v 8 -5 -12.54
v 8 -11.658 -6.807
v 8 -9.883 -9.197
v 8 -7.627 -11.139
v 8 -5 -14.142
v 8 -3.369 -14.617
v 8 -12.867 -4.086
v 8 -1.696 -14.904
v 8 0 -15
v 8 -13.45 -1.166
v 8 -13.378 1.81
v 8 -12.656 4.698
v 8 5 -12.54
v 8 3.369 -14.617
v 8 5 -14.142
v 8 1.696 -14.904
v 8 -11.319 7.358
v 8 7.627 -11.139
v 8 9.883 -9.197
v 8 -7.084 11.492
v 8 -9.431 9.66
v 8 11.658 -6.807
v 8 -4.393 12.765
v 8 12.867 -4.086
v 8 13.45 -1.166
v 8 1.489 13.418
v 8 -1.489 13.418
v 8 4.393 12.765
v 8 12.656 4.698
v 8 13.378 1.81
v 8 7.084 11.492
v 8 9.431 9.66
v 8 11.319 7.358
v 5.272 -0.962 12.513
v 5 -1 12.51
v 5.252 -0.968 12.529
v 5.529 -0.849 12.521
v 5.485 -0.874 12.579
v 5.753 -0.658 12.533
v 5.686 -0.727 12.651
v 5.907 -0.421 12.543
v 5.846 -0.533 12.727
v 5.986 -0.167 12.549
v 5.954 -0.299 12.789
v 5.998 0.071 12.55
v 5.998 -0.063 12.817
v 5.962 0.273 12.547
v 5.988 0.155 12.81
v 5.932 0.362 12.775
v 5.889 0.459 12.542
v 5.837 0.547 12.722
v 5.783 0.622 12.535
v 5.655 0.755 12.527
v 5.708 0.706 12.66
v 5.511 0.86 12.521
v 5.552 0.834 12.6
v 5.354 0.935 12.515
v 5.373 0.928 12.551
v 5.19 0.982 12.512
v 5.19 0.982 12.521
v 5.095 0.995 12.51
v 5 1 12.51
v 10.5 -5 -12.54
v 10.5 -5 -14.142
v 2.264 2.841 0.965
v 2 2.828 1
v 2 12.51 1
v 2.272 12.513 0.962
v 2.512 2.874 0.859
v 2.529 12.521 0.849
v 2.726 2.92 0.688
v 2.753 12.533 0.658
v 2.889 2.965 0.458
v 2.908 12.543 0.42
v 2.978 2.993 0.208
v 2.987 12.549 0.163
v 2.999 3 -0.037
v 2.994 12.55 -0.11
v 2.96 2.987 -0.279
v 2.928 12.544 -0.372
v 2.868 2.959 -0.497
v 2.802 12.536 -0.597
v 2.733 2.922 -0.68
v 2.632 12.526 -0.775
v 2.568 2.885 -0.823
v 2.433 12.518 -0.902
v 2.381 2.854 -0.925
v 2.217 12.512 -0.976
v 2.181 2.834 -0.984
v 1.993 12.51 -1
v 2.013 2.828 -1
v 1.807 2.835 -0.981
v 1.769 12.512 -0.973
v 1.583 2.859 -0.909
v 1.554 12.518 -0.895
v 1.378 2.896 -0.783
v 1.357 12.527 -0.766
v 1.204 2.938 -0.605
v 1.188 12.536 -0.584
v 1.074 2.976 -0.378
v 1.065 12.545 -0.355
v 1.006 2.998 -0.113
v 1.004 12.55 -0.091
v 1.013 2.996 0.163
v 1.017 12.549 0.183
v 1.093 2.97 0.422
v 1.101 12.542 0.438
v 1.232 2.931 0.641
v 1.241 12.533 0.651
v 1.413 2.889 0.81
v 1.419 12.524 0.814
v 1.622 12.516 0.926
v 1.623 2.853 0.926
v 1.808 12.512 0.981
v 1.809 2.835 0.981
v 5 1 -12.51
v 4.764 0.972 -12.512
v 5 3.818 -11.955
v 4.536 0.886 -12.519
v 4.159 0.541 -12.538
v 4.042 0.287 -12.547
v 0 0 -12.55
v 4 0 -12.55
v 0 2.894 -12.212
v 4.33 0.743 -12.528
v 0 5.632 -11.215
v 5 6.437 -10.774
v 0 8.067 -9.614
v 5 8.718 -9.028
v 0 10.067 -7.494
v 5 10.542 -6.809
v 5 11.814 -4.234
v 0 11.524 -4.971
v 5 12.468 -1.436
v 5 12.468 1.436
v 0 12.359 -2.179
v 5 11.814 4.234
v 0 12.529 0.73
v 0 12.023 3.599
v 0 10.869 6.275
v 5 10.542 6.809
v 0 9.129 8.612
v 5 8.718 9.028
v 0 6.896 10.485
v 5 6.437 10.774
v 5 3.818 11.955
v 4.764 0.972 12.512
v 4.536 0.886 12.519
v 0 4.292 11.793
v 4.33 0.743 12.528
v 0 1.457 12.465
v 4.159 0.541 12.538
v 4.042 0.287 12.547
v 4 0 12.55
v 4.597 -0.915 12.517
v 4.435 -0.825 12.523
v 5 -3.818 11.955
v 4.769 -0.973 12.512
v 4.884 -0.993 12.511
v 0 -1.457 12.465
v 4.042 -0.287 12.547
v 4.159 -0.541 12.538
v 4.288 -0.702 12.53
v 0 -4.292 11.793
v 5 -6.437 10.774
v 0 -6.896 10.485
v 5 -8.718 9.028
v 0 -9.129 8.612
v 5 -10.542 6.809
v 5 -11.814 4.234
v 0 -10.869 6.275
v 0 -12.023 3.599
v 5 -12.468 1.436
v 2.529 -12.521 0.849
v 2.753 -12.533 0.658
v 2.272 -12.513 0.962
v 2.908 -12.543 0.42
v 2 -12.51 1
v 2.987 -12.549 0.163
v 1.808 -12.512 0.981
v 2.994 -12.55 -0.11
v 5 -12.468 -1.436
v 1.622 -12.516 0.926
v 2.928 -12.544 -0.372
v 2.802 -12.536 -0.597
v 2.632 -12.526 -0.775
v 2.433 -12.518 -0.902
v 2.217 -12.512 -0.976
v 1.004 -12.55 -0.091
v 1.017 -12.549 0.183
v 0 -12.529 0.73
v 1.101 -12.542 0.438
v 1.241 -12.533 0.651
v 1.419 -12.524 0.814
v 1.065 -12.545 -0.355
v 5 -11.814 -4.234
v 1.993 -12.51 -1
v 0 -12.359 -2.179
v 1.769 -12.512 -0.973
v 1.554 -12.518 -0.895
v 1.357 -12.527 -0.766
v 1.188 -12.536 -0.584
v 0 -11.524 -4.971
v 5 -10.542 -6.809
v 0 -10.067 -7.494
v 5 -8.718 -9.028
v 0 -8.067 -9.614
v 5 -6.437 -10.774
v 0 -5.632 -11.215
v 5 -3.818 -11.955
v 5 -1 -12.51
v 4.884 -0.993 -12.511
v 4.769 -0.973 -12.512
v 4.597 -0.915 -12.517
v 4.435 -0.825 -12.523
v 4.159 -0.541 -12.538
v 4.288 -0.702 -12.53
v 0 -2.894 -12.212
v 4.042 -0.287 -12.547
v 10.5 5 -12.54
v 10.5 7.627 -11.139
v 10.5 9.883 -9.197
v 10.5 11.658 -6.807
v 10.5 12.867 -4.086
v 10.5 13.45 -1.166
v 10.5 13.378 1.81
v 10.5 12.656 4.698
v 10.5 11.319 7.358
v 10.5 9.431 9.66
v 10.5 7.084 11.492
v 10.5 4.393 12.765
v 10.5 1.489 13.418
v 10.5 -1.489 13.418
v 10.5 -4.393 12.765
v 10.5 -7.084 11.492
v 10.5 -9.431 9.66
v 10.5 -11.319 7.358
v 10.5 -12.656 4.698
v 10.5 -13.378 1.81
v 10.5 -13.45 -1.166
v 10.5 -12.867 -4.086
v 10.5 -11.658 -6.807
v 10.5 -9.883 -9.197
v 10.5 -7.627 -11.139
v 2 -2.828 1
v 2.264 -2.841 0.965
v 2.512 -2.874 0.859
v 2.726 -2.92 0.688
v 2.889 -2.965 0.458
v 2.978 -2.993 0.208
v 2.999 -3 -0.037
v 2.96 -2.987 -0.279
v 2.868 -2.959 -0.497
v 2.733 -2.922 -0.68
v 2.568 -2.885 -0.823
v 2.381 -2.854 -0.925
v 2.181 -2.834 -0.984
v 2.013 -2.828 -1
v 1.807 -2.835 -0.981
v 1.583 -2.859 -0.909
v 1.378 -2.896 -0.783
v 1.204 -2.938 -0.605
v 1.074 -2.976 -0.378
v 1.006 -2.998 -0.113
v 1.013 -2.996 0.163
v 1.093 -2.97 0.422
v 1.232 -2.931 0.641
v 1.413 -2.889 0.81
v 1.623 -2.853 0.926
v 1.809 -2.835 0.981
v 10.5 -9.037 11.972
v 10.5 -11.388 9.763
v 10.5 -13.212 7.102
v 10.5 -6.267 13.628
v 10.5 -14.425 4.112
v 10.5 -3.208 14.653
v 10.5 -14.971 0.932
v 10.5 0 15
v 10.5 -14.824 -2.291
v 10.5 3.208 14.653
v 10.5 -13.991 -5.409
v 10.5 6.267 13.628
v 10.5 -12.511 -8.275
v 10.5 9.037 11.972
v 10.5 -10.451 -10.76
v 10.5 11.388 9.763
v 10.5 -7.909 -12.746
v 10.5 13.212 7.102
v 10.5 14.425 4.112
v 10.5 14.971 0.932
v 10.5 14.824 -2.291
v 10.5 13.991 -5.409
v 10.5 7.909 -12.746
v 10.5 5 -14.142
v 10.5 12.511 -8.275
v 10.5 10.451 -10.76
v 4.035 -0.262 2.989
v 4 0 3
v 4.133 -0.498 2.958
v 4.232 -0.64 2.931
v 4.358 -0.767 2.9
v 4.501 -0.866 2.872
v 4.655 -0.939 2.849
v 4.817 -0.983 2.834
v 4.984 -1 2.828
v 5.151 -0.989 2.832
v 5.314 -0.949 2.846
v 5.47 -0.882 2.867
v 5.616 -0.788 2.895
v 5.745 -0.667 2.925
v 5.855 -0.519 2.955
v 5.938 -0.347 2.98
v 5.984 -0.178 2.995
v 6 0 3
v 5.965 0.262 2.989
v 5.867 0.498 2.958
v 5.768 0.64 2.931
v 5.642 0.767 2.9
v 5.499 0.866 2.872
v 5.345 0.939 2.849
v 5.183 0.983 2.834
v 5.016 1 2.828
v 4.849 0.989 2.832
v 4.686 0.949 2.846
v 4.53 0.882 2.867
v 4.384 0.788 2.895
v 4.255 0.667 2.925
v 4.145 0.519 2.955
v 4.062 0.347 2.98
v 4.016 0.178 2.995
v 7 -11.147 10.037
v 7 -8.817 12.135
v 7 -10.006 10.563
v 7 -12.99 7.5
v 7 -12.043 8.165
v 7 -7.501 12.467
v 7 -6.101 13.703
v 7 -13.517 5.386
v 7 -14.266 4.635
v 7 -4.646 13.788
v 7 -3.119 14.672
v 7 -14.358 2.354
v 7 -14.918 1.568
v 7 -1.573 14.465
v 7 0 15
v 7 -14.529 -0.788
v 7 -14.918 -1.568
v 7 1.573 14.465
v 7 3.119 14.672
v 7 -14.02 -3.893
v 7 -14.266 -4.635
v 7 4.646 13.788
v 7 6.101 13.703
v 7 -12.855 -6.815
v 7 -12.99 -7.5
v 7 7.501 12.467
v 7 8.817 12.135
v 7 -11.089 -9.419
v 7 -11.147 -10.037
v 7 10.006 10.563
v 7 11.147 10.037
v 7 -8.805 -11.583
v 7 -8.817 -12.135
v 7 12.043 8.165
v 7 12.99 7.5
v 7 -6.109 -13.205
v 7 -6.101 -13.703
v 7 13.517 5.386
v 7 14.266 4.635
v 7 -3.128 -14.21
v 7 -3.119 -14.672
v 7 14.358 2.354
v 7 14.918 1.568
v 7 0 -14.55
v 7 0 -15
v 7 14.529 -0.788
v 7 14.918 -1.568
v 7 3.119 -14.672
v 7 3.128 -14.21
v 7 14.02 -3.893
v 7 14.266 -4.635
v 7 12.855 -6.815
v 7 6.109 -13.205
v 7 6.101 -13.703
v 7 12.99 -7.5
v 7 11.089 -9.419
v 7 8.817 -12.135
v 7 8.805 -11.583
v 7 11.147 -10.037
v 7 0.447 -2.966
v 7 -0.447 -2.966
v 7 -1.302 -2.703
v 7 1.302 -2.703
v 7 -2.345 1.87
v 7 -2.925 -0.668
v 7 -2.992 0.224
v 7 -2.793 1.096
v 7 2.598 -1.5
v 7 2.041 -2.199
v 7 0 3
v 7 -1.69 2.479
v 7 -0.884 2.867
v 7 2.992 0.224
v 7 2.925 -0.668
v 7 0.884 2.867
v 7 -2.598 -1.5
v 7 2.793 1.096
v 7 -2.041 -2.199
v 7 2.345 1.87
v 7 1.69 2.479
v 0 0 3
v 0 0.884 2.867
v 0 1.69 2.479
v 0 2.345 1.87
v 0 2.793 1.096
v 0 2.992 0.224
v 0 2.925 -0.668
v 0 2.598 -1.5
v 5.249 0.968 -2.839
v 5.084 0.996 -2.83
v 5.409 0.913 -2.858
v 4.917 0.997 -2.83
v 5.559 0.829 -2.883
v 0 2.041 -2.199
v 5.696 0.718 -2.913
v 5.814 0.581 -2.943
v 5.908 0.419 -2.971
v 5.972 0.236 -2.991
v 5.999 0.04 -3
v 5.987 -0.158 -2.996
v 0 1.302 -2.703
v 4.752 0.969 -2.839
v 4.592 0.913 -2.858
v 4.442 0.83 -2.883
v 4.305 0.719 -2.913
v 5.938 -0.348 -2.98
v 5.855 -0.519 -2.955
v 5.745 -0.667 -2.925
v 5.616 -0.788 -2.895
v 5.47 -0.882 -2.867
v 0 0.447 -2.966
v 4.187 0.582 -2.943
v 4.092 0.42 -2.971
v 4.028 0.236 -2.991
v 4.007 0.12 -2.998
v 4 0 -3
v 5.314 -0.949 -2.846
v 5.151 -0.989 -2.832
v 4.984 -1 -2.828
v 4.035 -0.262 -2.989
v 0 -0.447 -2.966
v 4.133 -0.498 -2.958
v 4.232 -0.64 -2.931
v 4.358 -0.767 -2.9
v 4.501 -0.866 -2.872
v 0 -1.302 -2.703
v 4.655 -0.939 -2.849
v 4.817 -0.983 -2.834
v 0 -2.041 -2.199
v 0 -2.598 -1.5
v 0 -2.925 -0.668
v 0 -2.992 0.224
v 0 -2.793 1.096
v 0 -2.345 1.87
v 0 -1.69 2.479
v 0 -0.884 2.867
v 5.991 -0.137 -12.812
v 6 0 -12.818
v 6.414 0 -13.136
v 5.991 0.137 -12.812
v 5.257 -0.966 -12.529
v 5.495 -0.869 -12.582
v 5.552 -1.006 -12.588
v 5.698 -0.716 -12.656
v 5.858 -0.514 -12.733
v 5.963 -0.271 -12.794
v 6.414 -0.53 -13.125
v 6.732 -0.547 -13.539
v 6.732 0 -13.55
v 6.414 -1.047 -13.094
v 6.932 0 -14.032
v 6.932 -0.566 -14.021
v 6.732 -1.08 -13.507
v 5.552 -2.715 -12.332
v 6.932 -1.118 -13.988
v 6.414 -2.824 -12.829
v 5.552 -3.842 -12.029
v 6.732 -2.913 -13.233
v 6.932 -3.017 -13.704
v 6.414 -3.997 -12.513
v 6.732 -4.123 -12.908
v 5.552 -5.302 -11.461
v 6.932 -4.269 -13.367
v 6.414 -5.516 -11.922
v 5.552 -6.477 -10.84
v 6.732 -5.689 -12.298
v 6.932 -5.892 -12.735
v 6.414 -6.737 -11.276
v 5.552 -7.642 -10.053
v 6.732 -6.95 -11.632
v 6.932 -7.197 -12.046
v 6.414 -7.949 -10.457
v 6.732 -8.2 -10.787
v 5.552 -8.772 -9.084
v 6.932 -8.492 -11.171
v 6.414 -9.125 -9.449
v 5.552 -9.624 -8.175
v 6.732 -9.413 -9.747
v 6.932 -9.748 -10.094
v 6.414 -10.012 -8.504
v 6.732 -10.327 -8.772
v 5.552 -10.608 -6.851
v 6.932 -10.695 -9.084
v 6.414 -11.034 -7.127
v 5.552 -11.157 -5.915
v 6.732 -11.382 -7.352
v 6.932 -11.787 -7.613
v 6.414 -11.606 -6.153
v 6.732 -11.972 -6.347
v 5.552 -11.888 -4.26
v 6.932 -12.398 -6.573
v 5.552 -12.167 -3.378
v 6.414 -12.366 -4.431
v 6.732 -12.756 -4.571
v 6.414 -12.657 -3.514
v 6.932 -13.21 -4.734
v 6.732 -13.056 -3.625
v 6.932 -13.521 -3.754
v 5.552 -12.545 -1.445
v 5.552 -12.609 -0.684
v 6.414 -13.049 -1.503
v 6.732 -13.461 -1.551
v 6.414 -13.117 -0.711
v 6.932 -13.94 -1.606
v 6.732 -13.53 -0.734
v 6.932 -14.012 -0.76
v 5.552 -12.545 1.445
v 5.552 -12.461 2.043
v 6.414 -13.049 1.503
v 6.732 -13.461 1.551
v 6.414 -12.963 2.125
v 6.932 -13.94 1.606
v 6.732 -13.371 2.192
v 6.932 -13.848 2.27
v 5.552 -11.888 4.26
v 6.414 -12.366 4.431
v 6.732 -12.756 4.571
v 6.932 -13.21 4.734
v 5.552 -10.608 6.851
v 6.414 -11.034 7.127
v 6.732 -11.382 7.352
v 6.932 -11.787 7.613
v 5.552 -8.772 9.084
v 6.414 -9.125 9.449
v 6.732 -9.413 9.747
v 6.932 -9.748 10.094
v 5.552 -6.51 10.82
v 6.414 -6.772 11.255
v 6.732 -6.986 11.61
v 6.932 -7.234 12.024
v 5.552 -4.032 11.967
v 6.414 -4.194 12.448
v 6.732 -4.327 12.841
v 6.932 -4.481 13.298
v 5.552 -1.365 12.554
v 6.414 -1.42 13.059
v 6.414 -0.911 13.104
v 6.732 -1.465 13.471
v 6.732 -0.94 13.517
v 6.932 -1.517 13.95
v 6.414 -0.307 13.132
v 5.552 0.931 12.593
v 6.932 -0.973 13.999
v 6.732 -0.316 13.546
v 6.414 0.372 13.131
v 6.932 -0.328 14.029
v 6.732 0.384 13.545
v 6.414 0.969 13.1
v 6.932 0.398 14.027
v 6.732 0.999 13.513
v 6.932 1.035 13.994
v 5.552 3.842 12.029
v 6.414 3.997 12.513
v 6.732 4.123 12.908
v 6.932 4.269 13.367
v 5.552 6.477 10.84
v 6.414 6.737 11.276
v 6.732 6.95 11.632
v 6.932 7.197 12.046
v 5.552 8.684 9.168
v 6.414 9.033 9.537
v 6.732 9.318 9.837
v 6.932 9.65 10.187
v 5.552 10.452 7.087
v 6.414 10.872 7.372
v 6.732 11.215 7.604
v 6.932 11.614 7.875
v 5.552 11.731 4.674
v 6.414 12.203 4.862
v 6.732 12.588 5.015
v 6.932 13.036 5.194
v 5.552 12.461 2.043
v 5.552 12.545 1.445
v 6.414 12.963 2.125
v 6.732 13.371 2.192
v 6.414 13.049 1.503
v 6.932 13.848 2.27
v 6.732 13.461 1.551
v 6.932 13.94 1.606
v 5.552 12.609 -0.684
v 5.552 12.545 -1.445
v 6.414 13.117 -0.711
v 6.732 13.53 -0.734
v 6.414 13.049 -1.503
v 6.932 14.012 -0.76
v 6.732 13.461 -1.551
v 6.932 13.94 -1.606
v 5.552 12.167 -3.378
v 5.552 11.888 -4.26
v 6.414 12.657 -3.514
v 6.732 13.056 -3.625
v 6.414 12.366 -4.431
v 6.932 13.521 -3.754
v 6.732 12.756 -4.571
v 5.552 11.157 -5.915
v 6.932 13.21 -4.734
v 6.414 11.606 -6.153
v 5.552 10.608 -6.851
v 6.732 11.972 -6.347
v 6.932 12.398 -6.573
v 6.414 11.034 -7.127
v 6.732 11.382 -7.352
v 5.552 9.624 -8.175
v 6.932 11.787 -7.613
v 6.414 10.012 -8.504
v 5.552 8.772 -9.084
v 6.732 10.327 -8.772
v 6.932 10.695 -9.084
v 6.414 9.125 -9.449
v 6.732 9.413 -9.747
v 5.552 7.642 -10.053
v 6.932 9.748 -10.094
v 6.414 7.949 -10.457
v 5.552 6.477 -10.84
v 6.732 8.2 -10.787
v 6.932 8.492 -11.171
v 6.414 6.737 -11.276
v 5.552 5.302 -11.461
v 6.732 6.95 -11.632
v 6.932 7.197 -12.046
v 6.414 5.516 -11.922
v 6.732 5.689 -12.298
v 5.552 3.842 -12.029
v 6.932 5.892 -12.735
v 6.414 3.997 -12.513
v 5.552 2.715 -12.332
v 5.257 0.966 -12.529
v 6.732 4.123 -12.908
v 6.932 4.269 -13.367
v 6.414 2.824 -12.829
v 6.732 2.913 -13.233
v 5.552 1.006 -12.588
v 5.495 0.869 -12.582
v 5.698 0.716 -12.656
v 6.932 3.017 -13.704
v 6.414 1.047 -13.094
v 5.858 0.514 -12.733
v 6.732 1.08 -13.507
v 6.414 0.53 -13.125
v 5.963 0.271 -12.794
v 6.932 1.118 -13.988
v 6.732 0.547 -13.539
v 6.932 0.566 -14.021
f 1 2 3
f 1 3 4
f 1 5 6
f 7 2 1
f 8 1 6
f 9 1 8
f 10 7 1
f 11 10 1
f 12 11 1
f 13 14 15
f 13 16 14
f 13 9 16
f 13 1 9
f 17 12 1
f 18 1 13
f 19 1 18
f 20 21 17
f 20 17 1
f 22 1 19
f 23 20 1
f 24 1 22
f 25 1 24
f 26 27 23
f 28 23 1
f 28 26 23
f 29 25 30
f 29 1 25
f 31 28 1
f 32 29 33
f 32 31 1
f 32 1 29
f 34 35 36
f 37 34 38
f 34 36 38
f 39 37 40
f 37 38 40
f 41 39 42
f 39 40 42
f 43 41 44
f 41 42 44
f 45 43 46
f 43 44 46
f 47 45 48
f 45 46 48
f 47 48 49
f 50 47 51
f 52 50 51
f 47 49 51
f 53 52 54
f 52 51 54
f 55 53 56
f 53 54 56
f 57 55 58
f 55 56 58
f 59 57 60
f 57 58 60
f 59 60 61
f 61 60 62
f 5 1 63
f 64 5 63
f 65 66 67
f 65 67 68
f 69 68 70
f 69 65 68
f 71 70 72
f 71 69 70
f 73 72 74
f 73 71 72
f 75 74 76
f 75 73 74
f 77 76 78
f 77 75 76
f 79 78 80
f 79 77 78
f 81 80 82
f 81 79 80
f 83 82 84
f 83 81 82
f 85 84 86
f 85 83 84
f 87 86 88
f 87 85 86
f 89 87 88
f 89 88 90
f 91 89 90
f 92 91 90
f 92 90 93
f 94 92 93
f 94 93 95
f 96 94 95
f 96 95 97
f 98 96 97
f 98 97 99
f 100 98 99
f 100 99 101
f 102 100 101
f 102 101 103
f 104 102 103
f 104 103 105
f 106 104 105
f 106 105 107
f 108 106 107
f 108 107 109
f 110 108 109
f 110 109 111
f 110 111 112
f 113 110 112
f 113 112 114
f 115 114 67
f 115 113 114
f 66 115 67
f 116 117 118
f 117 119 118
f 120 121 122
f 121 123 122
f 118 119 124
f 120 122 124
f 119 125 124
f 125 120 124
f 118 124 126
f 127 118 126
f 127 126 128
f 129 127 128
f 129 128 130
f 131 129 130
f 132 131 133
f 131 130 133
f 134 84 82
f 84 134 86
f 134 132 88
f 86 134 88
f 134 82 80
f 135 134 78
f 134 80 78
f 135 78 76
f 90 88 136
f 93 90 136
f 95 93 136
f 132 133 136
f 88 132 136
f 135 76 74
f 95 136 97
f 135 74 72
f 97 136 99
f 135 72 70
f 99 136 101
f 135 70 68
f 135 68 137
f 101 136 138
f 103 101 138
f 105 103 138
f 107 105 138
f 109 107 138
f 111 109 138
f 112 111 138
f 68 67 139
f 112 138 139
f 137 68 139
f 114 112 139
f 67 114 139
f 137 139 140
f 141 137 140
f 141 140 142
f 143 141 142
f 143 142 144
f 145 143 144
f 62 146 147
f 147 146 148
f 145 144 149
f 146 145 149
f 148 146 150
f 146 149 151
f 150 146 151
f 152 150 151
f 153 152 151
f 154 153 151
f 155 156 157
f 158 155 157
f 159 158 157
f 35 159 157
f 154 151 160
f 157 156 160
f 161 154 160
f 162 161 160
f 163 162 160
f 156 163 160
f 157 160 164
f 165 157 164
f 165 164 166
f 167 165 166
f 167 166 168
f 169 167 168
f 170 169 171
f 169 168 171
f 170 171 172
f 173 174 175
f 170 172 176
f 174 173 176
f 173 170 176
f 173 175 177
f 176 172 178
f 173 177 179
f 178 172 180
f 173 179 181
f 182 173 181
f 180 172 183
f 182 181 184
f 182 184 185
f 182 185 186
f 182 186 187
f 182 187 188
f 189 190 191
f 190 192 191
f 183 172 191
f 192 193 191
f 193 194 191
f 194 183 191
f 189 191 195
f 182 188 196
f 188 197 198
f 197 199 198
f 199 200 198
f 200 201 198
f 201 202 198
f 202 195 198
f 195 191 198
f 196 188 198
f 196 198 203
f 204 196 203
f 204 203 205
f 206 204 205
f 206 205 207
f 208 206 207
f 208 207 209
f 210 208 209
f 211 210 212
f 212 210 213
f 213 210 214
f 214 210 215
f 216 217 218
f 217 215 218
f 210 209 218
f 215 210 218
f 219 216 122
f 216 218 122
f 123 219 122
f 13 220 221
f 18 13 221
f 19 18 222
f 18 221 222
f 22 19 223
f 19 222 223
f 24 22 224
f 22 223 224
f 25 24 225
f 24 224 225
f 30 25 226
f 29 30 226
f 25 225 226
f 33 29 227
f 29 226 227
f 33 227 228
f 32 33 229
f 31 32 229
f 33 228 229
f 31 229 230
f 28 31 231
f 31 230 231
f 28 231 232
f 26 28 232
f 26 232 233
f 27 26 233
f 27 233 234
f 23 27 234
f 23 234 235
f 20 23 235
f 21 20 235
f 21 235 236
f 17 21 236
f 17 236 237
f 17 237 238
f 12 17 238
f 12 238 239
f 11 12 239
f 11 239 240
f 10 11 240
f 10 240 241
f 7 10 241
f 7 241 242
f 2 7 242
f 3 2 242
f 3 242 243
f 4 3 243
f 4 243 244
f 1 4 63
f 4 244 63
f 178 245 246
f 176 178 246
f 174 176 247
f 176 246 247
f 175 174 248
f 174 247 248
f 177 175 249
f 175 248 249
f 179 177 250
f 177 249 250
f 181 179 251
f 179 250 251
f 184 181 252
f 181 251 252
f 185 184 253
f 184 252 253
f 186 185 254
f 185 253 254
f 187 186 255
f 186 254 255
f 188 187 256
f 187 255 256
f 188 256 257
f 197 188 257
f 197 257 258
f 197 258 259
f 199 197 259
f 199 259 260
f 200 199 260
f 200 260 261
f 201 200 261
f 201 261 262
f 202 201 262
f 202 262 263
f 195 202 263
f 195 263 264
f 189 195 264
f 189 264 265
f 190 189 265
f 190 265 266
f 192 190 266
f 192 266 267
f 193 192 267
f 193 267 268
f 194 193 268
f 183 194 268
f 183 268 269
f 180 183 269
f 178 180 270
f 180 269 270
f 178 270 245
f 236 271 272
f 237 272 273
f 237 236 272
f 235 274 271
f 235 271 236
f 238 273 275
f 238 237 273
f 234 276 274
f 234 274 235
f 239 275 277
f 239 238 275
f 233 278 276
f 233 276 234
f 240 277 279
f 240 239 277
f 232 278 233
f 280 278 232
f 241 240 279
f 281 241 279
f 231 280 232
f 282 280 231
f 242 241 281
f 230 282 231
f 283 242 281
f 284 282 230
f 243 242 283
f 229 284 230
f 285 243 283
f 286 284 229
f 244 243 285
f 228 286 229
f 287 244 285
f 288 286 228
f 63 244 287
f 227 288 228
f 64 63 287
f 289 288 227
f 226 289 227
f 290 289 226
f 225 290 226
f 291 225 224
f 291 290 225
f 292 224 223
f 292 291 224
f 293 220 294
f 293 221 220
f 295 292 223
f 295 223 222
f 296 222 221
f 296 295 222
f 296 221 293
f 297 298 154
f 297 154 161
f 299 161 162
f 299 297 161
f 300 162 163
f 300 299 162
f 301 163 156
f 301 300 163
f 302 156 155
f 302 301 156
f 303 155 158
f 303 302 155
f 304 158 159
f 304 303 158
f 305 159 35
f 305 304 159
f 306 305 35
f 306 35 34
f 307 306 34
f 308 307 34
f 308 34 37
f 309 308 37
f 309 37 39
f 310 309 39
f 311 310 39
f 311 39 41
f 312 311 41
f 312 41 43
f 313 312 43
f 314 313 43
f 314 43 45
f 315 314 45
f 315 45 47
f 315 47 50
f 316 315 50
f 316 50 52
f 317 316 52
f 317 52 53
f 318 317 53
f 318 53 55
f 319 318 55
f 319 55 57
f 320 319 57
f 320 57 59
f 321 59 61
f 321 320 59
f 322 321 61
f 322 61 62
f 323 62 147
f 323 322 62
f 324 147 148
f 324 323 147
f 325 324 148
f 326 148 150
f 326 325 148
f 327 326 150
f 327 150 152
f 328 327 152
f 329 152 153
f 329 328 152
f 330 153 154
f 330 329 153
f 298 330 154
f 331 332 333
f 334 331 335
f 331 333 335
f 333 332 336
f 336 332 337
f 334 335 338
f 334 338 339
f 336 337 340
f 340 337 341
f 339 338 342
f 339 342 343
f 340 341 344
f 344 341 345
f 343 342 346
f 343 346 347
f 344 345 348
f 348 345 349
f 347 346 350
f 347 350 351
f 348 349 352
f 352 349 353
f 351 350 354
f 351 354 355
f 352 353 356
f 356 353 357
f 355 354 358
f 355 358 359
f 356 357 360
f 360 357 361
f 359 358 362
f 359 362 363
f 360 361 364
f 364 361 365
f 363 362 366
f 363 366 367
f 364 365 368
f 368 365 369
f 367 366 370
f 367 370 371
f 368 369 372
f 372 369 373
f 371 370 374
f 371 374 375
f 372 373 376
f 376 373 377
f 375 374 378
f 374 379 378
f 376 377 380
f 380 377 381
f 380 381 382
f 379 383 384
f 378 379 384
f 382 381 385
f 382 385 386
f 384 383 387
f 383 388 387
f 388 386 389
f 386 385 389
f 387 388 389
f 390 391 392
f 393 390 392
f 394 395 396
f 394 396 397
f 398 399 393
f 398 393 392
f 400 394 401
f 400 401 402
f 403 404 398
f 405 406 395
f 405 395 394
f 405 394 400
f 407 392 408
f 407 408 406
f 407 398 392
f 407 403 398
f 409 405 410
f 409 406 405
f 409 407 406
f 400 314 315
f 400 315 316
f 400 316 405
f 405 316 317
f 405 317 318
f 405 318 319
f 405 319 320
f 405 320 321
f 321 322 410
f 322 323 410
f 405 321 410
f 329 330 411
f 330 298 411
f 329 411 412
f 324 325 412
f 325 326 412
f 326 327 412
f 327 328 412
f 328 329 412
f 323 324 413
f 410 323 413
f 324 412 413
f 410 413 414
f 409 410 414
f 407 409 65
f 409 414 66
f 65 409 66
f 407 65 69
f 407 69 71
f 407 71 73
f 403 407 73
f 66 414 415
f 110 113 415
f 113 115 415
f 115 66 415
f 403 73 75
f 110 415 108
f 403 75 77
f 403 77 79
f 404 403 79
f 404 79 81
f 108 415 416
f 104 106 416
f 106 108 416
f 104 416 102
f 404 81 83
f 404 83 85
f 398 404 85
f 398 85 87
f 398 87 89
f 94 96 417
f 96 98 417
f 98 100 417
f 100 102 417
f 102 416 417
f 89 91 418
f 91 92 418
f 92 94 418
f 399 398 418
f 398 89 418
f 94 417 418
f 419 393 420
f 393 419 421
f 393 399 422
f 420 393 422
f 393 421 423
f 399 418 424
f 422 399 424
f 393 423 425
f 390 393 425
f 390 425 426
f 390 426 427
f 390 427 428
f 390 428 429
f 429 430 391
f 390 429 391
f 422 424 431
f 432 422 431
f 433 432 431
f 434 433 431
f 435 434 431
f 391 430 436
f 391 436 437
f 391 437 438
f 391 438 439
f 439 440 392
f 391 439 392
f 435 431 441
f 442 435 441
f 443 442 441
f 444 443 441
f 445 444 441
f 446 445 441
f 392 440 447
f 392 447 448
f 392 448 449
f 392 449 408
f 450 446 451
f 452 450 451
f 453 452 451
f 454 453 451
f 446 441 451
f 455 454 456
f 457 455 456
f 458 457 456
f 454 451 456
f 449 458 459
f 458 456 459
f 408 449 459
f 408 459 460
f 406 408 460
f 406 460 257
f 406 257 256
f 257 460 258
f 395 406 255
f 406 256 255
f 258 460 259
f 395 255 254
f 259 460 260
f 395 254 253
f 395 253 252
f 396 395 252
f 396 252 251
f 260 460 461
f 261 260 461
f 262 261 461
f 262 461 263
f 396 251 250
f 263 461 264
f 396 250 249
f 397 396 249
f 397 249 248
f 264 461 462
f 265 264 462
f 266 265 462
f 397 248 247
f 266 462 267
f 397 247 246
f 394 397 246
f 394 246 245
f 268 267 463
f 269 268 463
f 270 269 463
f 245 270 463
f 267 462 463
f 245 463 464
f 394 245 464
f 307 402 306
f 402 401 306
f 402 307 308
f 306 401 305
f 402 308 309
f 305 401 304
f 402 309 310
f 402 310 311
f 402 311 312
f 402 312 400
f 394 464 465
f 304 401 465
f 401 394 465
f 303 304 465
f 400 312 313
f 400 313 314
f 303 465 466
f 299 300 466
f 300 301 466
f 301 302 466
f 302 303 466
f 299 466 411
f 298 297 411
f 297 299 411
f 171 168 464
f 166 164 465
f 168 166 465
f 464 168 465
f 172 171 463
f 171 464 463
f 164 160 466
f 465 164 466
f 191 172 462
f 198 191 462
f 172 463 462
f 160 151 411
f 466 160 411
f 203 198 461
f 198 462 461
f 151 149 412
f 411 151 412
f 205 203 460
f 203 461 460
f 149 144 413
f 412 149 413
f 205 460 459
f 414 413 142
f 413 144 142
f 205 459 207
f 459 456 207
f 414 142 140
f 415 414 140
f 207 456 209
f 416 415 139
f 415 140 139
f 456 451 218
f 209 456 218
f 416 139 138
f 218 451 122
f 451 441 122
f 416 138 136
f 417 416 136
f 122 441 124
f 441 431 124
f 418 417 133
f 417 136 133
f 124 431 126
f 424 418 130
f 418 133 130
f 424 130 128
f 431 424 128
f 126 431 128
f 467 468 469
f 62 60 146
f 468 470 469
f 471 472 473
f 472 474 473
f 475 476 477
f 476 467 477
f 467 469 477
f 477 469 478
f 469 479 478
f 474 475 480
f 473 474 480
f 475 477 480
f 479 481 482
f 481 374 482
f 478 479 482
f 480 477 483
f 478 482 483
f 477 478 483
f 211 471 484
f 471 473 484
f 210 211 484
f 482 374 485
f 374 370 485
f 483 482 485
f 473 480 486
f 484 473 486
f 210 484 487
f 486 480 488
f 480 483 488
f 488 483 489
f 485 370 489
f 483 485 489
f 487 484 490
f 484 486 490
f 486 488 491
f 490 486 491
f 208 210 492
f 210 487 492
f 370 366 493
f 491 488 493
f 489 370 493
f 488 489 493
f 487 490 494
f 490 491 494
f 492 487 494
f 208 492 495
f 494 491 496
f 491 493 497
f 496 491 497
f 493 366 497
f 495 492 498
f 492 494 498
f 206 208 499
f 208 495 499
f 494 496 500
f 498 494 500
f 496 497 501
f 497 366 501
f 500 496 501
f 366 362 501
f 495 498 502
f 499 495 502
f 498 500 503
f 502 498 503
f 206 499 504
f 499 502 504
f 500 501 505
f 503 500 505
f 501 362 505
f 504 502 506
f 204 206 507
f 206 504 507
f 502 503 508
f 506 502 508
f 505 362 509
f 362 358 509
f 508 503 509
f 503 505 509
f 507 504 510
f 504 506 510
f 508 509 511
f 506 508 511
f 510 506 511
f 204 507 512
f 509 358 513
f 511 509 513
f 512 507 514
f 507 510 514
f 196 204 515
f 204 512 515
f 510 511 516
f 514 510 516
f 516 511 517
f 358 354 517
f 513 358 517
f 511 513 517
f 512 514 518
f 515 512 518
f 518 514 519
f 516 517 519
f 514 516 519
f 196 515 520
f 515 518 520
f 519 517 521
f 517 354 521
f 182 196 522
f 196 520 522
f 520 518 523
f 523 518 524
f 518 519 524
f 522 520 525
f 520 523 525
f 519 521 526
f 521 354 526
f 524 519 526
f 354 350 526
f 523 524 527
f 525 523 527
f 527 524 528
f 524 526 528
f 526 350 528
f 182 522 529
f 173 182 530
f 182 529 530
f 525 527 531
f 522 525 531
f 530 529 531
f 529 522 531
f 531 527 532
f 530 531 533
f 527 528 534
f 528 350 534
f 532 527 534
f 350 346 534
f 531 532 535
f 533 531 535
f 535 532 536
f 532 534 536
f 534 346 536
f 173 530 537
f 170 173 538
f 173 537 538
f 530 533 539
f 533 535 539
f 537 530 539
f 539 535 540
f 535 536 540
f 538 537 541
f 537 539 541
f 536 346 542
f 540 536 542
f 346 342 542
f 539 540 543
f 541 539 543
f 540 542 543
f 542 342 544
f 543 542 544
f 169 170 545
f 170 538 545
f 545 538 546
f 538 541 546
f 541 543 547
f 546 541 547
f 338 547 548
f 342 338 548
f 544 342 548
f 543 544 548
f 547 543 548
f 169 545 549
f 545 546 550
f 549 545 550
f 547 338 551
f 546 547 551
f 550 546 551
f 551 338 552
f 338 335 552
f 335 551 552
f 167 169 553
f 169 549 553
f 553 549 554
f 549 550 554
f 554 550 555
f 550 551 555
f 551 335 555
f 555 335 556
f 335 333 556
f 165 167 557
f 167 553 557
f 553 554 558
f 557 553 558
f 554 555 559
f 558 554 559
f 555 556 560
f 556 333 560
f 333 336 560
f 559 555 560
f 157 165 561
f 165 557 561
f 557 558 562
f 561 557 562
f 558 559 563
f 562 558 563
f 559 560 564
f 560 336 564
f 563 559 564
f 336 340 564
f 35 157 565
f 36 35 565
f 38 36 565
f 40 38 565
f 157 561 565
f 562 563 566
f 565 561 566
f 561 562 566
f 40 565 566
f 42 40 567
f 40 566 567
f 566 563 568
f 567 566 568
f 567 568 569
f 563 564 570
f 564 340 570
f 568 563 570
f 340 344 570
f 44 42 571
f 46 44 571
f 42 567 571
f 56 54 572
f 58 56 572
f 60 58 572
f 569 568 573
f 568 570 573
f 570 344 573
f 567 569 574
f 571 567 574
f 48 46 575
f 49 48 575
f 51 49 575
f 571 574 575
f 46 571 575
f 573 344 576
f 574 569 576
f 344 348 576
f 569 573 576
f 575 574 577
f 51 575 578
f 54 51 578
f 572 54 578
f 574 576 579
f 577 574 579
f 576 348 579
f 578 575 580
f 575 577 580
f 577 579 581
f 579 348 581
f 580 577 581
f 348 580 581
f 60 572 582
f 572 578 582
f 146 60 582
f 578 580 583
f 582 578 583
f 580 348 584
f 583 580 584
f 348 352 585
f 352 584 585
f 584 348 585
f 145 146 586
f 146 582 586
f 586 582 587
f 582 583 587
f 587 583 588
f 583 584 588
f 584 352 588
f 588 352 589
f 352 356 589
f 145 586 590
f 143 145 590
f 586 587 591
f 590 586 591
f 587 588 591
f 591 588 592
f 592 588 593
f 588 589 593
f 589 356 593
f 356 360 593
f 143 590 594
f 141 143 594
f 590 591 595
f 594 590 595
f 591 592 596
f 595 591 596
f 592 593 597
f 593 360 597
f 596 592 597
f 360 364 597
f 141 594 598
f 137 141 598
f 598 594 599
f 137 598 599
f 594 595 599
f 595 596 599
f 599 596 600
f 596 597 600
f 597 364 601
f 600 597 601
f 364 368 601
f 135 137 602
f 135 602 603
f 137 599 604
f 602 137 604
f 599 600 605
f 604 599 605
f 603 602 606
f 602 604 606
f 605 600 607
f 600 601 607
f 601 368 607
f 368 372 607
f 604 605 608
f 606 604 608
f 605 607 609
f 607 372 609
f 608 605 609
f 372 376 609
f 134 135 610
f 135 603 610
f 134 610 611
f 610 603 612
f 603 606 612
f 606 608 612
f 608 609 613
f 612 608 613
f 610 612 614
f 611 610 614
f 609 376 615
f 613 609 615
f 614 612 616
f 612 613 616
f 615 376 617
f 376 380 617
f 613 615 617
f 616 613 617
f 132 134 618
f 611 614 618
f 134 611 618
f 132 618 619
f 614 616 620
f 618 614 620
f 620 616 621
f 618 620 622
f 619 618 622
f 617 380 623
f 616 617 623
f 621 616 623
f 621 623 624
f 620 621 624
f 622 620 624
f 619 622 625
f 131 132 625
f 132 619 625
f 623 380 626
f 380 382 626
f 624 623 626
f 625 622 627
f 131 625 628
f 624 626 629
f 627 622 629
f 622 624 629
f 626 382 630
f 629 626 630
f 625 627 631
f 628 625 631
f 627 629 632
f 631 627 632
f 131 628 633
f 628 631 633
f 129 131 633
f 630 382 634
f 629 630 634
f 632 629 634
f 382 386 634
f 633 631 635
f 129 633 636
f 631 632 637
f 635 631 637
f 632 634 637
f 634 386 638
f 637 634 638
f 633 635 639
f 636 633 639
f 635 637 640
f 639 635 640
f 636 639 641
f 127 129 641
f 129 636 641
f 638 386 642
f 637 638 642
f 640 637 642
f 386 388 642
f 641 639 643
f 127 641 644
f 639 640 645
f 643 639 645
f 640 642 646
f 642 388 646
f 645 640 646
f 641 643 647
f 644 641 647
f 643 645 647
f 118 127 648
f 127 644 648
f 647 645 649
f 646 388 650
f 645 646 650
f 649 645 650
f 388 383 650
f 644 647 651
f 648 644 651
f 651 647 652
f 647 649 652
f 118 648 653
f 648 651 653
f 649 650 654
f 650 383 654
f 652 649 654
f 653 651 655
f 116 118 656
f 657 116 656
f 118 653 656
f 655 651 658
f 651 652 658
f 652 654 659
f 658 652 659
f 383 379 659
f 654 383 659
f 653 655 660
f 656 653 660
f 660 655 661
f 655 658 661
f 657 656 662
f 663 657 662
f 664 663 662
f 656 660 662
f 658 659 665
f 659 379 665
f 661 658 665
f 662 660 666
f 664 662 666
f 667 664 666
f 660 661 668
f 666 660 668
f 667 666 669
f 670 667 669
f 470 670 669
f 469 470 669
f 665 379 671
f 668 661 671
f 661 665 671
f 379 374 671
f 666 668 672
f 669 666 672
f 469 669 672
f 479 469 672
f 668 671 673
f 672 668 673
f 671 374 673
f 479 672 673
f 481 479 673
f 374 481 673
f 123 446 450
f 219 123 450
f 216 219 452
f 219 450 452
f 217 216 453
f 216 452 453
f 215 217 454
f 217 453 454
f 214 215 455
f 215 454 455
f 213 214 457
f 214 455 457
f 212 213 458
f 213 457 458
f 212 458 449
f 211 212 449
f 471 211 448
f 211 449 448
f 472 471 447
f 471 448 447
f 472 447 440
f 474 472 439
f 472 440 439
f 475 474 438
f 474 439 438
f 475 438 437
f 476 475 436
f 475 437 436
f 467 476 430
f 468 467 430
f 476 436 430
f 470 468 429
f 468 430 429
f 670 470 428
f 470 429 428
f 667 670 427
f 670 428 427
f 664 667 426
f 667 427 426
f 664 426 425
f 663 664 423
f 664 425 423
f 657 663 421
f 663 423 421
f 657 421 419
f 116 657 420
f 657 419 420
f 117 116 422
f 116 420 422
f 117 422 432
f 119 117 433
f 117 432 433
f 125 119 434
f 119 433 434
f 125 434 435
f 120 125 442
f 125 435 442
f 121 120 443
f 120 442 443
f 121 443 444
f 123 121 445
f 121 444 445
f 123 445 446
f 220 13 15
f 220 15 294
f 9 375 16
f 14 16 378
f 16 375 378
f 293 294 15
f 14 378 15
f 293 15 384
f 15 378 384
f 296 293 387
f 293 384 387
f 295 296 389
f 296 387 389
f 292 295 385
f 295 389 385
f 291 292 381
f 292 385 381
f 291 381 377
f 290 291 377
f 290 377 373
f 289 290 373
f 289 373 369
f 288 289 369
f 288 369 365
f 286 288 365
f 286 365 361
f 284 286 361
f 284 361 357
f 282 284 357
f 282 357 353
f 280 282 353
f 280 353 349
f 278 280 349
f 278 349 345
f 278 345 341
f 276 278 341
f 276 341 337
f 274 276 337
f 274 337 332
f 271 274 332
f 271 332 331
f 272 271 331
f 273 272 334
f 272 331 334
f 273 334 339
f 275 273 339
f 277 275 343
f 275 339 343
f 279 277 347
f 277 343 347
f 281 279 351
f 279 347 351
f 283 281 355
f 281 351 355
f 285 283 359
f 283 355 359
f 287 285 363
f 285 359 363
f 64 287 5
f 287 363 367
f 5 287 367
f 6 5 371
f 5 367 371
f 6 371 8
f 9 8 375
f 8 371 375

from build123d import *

# Parameters (mm, degrees)
SKETCH_1_R                      = 12.55
EXTRUDE_1_DEPTH                 = 8
SKETCH_2_R                      = 3
CUT_EXTRUDE_1_DEPTH             = 7
CUT_EXTRUDE_2_REACH             = 21.468
SKETCH_3_R                      = 1
CUT_EXTRUDE_2_DIRECTION_2_REACH = 21.468
CUT_EXTRUDE_3_DEPTH             = 21
CUT_EXTRUDE_3_DEPTH_BACK        = 19
SKETCH_4_R                      = 1
EXTRUDE_2_DEPTH                 = 2.5
EXTRUDE_2_DEPTH_BACK            = 1
SKETCH_5_R                      = 15
SKETCH_6_R                      = 13.5
CUT_EXTRUDE_4_DEPTH             = 2.5
FILLET_1_R                      = 2
SKETCH_7_W                      = 2.5
SKETCH_7_H                      = 10
CUT_EXTRUDE_5_DEPTH             = 21.5


with BuildPart() as part:
    # 草图1 → 凸台-拉伸1 (new body)
    with BuildSketch(Plane(origin=(0, 0, 0), x_dir=(0, 0, -1), z_dir=(1, 0, 0))):
        Circle(SKETCH_1_R)
    extrude(amount=EXTRUDE_1_DEPTH)

    # 草图2 → 切除-拉伸1 (cut)
    with BuildSketch(Plane.ZY):
        Circle(SKETCH_2_R)
    extrude(amount=-CUT_EXTRUDE_1_DEPTH, mode=Mode.SUBTRACT)

    # 草图3 → 切除-拉伸2 (cut, up to next)
    with BuildSketch(Plane(origin=(0, 0, 0), x_dir=(1, 0, 0), z_dir=(0, 1, 0)), mode=Mode.PRIVATE) as cut_extrude_2_sk1:
        with Locations(Location((2, 0, 0), (0, 0, 270))):
            Circle(SKETCH_3_R)
    cut_extrude_2_tool1 = extrude(cut_extrude_2_sk1.sketch, amount=-CUT_EXTRUDE_2_REACH, mode=Mode.PRIVATE) & part.part
    add(cut_extrude_2_tool1.solids().sort_by_distance((2, 0, 0))[0], mode=Mode.SUBTRACT)

    # 草图3 → 切除-拉伸2 direction 2 (cut, up to next)
    with BuildSketch(Plane(origin=(0, 0, 0), x_dir=(1, 0, 0), z_dir=(0, 1, 0)), mode=Mode.PRIVATE) as cut_extrude_2_direction_2_sk1:
        with Locations(Location((2, 0, 0), (0, 0, 270))):
            Circle(SKETCH_3_R)
    cut_extrude_2_direction_2_tool1 = extrude(cut_extrude_2_direction_2_sk1.sketch, amount=CUT_EXTRUDE_2_DIRECTION_2_REACH, mode=Mode.PRIVATE) & part.part
    add(cut_extrude_2_direction_2_tool1.solids().sort_by_distance((2, 0, 0))[0], mode=Mode.SUBTRACT)

    # 草图4 → 切除-拉伸3 (cut, two sides: drawn at the far end of the back side and taken through both)
    with BuildSketch(Plane.XY.offset(-CUT_EXTRUDE_3_DEPTH_BACK)):
        with Locations(Location((5, 0, 0), (0, 0, 180))):
            Circle(SKETCH_4_R)
    extrude(amount=CUT_EXTRUDE_3_DEPTH + CUT_EXTRUDE_3_DEPTH_BACK, mode=Mode.SUBTRACT)

    # 草图5 → 凸台-拉伸2 (add, two sides: drawn at the far end of the back side and taken through both)
    with BuildSketch(Plane(origin=(8, 0, 0), x_dir=(0, 0, -1), z_dir=(1, 0, 0)).offset(-EXTRUDE_2_DEPTH_BACK)):
        Circle(SKETCH_5_R)
    extrude(amount=EXTRUDE_2_DEPTH + EXTRUDE_2_DEPTH_BACK)

    # 草图6 → 切除-拉伸4 (cut)
    with BuildSketch(Plane(origin=(10.5, 0, 0), x_dir=(0, 0, -1), z_dir=(1, 0, 0))):
        Circle(SKETCH_6_R)
    extrude(amount=-CUT_EXTRUDE_4_DEPTH, mode=Mode.SUBTRACT)

    # 圆角1
    # the kernel refuses this fillet: 2 mm, written as the material it adds along each edge
    with BuildSketch(Plane(origin=(7, 0, 0), x_dir=(0, 0, -1), z_dir=(0, 1, 0))) as fillet_1_piece_1_section:
        with BuildLine():
            CenterArc((12.55 + FILLET_1_R, FILLET_1_R), FILLET_1_R, 180, 90)
            Line((12.55 + FILLET_1_R, 0), (12.55, 0))
            Line((12.55, 0), (12.55, FILLET_1_R))
        make_face()
    fillet_1_piece_1 = revolve(axis=Axis((7, 0, 0), (-1, 0, 0)), mode=Mode.PRIVATE)
    fillet_1_piece_1 = fillet_1_piece_1 - Plane(origin=(5, 0, 13.104940956), x_dir=(-1, 0, 0), z_dir=(0, 0, 1)) * Cylinder(1, 59, mode=Mode.PRIVATE)
    add(fillet_1_piece_1)

    # 草图7 → 切除-拉伸5 (cut)
    with BuildSketch(Plane.XY):
        with Locations((9.25, 0)):
            Rectangle(SKETCH_7_W, SKETCH_7_H)
    extrude(amount=-CUT_EXTRUDE_5_DEPTH, mode=Mode.SUBTRACT)


solid = part.part
